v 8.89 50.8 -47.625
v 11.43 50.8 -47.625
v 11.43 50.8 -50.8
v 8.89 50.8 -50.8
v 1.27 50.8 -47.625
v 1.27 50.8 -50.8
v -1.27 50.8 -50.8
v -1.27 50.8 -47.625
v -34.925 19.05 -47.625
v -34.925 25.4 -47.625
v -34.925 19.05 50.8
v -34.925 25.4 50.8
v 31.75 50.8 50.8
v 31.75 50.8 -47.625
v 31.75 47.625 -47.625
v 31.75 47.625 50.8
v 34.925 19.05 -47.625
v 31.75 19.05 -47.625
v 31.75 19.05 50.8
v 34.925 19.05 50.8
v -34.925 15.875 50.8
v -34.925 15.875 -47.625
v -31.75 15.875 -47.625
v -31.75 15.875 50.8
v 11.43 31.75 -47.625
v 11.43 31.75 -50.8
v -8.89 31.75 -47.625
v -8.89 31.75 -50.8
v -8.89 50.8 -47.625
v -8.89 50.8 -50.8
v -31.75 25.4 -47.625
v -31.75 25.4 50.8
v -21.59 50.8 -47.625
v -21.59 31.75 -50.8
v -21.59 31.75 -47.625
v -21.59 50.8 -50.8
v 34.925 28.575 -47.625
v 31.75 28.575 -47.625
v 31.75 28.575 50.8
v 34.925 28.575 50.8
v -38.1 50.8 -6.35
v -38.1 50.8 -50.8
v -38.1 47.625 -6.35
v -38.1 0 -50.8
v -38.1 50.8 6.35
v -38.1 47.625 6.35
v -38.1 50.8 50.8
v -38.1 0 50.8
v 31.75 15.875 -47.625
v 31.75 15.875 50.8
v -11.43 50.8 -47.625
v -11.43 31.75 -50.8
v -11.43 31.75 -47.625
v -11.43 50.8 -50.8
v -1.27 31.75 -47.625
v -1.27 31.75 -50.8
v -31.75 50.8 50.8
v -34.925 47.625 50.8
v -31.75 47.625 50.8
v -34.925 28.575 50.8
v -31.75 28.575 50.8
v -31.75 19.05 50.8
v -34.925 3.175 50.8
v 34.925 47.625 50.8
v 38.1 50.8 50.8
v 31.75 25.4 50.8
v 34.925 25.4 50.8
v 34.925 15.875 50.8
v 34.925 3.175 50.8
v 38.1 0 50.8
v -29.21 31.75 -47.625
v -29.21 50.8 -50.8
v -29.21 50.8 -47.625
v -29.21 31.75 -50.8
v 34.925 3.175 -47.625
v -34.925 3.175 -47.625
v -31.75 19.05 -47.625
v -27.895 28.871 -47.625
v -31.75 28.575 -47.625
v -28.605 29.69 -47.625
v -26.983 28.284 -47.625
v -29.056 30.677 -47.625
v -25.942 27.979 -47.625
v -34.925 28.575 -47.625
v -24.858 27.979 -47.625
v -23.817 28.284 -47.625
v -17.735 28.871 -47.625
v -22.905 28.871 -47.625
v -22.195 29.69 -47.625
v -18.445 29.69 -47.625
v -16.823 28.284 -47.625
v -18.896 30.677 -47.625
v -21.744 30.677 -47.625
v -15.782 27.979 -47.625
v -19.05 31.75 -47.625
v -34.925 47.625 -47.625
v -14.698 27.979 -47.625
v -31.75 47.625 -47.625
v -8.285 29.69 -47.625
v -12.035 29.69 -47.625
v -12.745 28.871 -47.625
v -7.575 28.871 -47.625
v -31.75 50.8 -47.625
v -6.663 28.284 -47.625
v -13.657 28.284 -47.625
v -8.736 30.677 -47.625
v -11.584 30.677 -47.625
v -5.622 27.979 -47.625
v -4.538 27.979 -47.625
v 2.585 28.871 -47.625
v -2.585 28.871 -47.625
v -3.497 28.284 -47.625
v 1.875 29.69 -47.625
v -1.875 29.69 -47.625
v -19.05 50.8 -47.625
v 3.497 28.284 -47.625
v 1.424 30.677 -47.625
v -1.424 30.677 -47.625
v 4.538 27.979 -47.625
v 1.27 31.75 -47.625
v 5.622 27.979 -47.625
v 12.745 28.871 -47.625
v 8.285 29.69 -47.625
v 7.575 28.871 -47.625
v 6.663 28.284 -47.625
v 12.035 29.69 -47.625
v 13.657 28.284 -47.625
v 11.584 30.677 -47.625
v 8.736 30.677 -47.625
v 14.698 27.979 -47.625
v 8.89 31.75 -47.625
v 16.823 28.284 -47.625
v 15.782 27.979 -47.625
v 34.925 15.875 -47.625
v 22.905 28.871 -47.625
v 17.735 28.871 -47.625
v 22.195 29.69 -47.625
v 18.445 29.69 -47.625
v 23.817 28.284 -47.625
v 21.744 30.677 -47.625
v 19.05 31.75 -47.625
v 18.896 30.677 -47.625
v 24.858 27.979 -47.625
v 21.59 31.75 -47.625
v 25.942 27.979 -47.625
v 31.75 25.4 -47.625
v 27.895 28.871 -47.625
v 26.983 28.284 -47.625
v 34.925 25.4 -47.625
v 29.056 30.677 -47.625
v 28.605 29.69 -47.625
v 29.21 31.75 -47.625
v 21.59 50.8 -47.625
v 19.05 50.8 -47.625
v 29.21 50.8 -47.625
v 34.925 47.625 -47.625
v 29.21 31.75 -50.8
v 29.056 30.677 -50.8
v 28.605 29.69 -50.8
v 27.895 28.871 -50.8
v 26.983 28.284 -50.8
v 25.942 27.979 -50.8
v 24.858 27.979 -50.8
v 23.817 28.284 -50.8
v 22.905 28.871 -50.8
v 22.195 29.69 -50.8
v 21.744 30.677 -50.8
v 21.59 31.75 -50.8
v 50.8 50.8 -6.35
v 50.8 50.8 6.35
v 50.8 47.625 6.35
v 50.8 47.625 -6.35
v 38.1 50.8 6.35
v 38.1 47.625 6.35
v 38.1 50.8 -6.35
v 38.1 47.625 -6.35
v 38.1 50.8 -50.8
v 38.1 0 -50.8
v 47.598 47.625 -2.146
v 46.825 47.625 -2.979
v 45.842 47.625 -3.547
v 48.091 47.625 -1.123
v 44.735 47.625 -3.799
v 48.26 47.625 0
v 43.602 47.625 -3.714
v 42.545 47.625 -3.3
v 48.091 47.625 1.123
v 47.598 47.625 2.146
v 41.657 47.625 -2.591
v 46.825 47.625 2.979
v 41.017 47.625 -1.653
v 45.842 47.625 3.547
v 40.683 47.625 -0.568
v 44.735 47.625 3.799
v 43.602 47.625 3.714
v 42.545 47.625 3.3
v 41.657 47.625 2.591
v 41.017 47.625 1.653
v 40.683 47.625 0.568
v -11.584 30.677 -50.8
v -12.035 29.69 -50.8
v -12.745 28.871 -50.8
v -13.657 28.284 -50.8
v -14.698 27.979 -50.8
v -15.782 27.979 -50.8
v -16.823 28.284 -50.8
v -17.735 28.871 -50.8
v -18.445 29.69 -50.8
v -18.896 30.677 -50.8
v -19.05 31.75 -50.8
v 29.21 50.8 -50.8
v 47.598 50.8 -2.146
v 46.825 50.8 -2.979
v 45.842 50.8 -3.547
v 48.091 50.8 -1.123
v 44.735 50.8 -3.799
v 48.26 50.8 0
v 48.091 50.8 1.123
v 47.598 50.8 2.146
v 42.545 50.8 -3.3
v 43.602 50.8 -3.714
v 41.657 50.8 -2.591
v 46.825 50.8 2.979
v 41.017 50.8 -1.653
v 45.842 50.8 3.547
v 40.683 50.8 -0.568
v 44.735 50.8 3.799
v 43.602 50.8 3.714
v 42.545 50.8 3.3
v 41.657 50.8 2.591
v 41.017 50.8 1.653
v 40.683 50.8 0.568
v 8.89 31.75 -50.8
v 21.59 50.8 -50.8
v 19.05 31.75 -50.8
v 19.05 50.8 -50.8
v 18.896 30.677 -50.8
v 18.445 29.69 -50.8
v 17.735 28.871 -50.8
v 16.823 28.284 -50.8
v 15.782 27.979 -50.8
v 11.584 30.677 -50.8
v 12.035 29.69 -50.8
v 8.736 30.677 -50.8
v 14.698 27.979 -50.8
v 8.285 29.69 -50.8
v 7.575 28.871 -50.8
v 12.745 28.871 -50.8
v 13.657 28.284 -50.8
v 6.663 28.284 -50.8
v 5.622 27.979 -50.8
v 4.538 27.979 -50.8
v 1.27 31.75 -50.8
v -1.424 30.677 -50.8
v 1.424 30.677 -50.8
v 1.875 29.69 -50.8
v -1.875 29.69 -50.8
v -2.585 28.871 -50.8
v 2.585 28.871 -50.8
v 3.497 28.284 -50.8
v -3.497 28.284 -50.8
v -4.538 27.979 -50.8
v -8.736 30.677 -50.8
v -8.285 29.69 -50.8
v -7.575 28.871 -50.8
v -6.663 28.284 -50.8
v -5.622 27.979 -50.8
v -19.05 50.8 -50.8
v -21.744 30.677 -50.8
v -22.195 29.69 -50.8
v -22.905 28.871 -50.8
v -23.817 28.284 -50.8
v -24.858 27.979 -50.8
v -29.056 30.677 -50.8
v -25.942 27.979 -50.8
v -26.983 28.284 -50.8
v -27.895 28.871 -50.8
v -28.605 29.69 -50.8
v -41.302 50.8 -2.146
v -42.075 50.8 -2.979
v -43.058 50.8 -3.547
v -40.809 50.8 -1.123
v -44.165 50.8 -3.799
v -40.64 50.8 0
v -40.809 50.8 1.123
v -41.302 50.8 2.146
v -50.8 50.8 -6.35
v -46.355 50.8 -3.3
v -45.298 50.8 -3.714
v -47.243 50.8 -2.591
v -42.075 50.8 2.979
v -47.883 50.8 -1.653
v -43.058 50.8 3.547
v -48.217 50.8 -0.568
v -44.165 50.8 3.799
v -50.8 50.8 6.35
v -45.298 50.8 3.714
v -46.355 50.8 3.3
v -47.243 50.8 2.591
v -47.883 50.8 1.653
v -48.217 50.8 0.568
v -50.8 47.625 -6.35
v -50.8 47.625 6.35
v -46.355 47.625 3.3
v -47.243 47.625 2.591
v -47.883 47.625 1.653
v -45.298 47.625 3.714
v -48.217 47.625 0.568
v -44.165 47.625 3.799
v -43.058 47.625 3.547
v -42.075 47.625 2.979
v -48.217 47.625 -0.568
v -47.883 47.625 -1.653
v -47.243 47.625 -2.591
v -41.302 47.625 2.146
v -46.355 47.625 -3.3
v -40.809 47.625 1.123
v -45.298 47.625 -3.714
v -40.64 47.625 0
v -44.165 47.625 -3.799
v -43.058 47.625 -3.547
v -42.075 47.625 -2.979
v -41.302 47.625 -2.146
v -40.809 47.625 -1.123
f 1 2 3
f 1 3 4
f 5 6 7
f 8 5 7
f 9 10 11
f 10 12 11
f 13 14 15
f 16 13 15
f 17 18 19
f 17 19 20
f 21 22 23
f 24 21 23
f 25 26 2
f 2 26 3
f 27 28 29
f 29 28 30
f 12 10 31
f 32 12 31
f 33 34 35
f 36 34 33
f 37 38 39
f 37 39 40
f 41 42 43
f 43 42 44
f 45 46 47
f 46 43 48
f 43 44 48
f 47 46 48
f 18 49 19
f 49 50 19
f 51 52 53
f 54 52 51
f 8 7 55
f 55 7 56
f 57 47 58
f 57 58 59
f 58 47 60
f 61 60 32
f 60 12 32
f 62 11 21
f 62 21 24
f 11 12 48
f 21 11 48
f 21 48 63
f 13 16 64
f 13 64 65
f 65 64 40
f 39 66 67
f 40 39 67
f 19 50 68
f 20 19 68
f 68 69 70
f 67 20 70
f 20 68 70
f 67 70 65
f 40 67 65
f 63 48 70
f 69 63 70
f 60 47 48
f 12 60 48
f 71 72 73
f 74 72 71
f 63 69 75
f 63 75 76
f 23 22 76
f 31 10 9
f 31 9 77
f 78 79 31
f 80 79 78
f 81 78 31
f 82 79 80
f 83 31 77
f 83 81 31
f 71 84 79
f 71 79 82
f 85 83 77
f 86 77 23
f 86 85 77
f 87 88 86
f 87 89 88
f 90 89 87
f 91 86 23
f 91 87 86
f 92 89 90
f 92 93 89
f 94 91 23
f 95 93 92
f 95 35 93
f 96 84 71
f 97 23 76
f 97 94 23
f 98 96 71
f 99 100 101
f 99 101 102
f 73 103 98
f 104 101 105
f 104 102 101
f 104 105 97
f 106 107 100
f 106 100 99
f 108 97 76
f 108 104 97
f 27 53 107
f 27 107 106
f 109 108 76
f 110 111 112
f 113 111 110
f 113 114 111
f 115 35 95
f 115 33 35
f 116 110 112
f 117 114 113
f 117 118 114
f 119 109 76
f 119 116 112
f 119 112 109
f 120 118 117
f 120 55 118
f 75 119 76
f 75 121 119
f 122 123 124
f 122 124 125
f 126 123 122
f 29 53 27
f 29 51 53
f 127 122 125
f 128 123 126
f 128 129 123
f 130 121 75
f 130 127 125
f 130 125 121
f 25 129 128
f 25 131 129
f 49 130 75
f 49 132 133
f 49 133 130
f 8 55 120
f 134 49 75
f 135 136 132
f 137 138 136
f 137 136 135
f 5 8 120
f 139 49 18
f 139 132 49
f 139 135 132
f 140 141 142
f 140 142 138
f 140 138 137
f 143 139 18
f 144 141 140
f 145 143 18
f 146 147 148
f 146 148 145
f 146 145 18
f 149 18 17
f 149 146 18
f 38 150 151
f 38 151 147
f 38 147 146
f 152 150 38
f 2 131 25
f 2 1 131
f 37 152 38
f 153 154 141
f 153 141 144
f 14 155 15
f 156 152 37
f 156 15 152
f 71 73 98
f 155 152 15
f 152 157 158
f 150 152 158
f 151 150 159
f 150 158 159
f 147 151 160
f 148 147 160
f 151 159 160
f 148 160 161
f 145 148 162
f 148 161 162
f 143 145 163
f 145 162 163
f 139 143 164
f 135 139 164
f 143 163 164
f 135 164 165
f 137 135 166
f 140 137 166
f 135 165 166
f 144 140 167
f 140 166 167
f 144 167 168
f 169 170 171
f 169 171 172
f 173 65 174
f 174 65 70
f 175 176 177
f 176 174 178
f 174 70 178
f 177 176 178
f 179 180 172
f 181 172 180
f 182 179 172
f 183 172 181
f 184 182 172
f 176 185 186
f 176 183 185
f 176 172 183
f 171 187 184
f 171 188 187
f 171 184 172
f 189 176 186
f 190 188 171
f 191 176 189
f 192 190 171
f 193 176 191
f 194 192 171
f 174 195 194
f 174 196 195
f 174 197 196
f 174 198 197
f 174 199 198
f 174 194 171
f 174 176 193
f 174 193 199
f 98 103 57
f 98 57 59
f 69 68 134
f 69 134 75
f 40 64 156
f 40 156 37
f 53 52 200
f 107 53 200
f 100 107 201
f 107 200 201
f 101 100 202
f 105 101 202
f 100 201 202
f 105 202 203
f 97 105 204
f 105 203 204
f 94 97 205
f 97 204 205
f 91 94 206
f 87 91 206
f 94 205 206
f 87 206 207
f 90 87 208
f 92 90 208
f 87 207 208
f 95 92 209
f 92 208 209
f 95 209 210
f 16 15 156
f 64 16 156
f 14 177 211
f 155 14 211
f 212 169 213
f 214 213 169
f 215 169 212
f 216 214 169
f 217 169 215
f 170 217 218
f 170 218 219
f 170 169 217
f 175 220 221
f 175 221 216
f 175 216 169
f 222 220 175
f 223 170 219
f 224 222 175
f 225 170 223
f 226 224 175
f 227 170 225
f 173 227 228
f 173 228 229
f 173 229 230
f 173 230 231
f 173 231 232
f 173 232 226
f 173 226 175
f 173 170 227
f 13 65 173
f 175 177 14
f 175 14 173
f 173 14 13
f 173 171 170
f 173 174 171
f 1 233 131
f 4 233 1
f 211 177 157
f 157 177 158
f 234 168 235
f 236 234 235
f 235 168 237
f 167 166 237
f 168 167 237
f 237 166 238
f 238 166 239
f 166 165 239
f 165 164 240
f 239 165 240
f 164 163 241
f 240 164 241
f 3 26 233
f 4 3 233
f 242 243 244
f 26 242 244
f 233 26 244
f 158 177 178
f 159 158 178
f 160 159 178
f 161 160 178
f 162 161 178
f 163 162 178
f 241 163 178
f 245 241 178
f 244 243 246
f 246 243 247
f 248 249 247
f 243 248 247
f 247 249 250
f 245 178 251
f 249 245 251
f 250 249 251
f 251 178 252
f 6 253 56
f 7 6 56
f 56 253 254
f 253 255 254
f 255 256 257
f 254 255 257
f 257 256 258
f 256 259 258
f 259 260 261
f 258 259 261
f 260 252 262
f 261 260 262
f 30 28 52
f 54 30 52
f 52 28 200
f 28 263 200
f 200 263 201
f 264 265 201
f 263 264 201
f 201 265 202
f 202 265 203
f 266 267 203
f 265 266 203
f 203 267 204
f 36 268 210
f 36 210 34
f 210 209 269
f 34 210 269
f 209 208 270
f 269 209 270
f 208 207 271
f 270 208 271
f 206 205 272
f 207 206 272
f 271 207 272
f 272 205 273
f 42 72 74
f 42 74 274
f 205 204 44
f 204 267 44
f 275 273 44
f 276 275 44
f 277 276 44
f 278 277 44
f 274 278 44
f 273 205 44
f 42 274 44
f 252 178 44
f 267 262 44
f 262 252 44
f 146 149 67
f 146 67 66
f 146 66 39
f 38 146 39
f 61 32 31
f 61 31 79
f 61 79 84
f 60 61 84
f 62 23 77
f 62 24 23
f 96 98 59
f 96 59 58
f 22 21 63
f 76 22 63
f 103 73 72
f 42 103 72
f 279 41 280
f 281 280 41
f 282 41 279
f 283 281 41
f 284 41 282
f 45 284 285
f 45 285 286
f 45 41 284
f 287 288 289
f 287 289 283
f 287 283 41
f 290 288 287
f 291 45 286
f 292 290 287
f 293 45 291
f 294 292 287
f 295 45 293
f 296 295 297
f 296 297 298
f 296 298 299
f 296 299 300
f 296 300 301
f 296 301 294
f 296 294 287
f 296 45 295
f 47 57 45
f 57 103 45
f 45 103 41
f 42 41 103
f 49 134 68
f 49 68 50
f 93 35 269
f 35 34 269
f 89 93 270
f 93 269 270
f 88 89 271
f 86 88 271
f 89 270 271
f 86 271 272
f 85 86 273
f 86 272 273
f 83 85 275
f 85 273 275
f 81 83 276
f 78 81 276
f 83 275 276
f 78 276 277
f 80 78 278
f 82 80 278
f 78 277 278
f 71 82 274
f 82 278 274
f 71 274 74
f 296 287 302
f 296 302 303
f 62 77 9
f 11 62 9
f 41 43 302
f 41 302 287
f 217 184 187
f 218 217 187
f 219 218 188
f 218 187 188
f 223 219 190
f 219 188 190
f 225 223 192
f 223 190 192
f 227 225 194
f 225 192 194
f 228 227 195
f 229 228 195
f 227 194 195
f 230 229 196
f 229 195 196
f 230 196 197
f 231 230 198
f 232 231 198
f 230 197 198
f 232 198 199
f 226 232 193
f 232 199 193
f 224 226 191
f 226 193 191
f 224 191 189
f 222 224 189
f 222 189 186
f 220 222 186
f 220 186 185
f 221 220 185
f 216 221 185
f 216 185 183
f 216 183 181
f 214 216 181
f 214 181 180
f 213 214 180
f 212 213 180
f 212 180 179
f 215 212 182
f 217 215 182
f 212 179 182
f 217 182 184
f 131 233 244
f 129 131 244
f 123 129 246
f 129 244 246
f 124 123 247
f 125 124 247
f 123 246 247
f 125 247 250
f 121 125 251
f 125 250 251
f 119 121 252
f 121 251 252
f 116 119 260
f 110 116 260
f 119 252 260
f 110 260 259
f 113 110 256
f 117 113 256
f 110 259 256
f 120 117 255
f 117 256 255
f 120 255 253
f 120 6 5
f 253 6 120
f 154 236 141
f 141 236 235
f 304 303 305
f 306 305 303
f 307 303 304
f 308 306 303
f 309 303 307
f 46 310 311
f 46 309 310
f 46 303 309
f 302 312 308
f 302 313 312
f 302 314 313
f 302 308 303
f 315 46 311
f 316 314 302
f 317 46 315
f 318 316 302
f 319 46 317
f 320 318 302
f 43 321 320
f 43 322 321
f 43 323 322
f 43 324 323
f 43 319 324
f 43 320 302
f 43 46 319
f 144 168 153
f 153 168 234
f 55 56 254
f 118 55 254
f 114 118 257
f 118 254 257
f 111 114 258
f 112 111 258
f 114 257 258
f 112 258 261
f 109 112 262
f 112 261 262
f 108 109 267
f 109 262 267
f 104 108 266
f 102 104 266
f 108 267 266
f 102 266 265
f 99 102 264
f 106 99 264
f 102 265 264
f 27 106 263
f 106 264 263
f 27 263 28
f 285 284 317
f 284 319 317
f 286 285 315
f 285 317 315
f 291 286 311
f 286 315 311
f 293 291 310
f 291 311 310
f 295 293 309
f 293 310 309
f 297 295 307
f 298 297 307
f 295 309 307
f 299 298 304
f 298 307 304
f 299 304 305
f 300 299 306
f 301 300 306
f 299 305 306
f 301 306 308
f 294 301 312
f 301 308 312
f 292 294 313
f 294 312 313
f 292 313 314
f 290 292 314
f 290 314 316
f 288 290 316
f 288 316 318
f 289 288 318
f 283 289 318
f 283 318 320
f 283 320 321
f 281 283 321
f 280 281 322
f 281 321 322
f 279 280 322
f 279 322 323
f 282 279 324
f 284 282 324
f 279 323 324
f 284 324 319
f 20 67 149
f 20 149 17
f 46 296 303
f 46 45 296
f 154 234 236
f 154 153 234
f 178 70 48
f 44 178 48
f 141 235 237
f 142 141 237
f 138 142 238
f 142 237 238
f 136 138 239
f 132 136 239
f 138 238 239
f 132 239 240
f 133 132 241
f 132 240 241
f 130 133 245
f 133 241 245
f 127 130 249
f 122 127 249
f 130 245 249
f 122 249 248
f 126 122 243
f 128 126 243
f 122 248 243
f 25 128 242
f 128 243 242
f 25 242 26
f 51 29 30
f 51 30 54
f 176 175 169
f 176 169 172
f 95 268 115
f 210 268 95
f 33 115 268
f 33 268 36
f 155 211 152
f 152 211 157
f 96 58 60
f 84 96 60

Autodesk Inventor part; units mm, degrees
ref_plane "YZ Plane" through (0, 0, 0) normal (1, 0, 0) x (0, 1, 0)
ref_plane "XZ Plane" through (0, 0, 0) normal (0, 1, 0) x (-1, 0, 0)
ref_plane "XY Plane" through (0, 0, 0) normal (0, 0, 1) x (1, 0, 0)
sketch "Sketch1" plane through (0, 0, 0) normal (0, 1, 0) x (-1, 0, 0)
  line L0 (38.1, 50.8) -> (-38.1, 50.8)
  line L1 (-38.1, 50.8) -> (-38.1, -50.8)
  line L2 (-38.1, -50.8) -> (38.1, -50.8)
  line L3 (38.1, -50.8) -> (38.1, 50.8)
  point P0 (0, 0)
  dimension "d0" = 101.6
  dimension "d1" = 76.2
  dimension "d2" = 38.1
  dimension "d3" = 50.8
extrude "Extrusion1" add sketch "Sketch1" along normal blind 50.8
sketch "Sketch2" plane through (-38.1, 0, 50.8) normal (0, 0, 1) x (1, 0, 0)
  line L0 (76.2, 50.8) -> (0, 50.8) projected
  line L1 (76.2, 0) -> (0, 0) projected
  line L2 (0, 50.8) -> (3.175, 50.8)
  line L3 (3.175, 50.8) -> (3.175, 0)
  line L4 (0, 0) -> (0, 50.8)
  line L5 (76.2, 0) -> (76.2, 50.8) projected
  line L6 (0, 50.8) -> (76.2, 50.8)
  line L7 (76.2, 50.8) -> (76.2, 47.625)
  line L8 (0, 47.625) -> (0, 50.8)
  line L9 (76.2, 50.8) -> (73.025, 50.8)
  line L10 (73.025, 50.8) -> (73.025, 0)
  line L11 (76.2, 0) -> (76.2, 50.8)
  line L12 (3.175, 15.875) -> (6.35, 15.875)
  line L13 (6.35, 15.875) -> (6.35, 19.05)
  line L14 (6.35, 19.05) -> (3.175, 19.05)
  line L15 (3.175, 19.05) -> (3.175, 15.875)
  line L16 (3.175, 25.4) -> (6.35, 25.4)
  line L17 (6.35, 25.4) -> (6.35, 28.575)
  line L18 (6.35, 28.575) -> (3.175, 28.575)
  line L19 (3.175, 28.575) -> (3.175, 25.4)
  line L20 (38.1, 47.625) -> (38.1, 0)
  line L21 (73.025, 15.875) -> (69.85, 15.875)
  line L22 (69.85, 15.875) -> (69.85, 19.05)
  line L23 (69.85, 19.05) -> (73.025, 19.05)
  line L24 (73.025, 25.4) -> (69.85, 25.4)
  line L25 (69.85, 25.4) -> (69.85, 28.575)
  line L26 (69.85, 28.575) -> (73.025, 28.575)
  line L27 (3.175, 50.8) -> (6.35, 50.8)
  line L28 (6.35, 50.8) -> (6.35, 47.625)
  line L29 (6.35, 47.625) -> (3.175, 47.625)
  line L30 (3.175, 47.625) -> (3.175, 50.8)
  line L31 (73.025, 50.8) -> (69.85, 50.8)
  line L32 (69.85, 50.8) -> (69.85, 47.625)
  line L33 (69.85, 47.625) -> (73.025, 47.625)
  line L34 (73.025, 47.625) -> (73.025, 50.8)
  line L35 (0, 0) -> (76.2, 0)
  line L36 (76.2, 0) -> (76.2, 3.175)
  line L37 (76.2, 3.175) -> (0, 3.175)
  line L38 (0, 3.175) -> (0, 0)
  point P0 (3.175, 3.175)
  point P1 (73.025, 3.175)
  point P2 (6.35, 50.8)
  point P3 (3.175, 47.625)
  point P4 (3.175, 28.575)
  point P5 (3.175, 19.05)
  dimension "d6" = 3.175
  dimension "d8" = 3.175
  dimension "d11" = 3.175
  dimension "d12" = 3.175
  dimension "d13" = 3.175
  dimension "d15" = 6.35
  dimension "d16" = 3.175
  dimension "d17" = 12.7
  dimension "d18" = 0
extrude "Extrusion2" cut sketch "Sketch2" against normal blind 98.425 contours L32 L33 L10 L26 L25 L24 L23 L22 L21 L37 L3 L12 L13 L14 L16 L17 L18 L29 L28 L0
sketch "Sketch3" plane through (38.1, 0, -50.8) normal (0, 0, -1) x (-1, 0, 0)
  line L0 (0, 50.8) -> (76.2, 50.8) projected
  line L1 (38.1, 0) -> (38.1, 50.8) construction
  line L2 (29.21, 50.8) -> (36.83, 50.8)
  line L3 (36.83, 50.8) -> (36.83, 31.75)
  line L4 (29.21, 31.75) -> (29.21, 50.8)
  line L5 (26.67, 50.8) -> (19.05, 50.8)
  line L6 (19.05, 50.8) -> (19.05, 31.75)
  line L7 (26.67, 31.75) -> (26.67, 50.8)
  line L8 (33.02, 31.75) -> (33.02, 50.8) construction
  line L9 (22.86, 31.75) -> (22.86, 50.8) construction
  line L10 (16.51, 50.8) -> (8.89, 50.8)
  line L11 (8.89, 50.8) -> (8.89, 31.75)
  line L12 (16.51, 31.75) -> (16.51, 50.8)
  line L13 (12.7, 31.75) -> (12.7, 50.8) construction
  arc A0 (8.89, 31.75) -> (16.51, 31.75) centre (12.7, 31.75) ccw
  arc A1 (19.05, 31.75) -> (26.67, 31.75) centre (22.86, 31.75) ccw
  arc A2 (29.21, 31.75) -> (36.83, 31.75) centre (33.02, 31.75) ccw
  line L14 (8.89, 31.75) -> (36.83, 31.75) construction
  line L15 (46.99, 50.8) -> (39.37, 50.8)
  line L16 (39.37, 50.8) -> (39.37, 31.75)
  line L17 (46.99, 31.75) -> (46.99, 50.8)
  line L18 (49.53, 50.8) -> (57.15, 50.8)
  line L19 (57.15, 50.8) -> (57.15, 31.75)
  line L20 (49.53, 31.75) -> (49.53, 50.8)
  line L21 (43.18, 31.75) -> (43.18, 50.8) construction
  line L22 (53.34, 31.75) -> (53.34, 50.8) construction
  line L23 (59.69, 50.8) -> (67.31, 50.8)
  line L24 (67.31, 50.8) -> (67.31, 31.75)
  line L25 (59.69, 31.75) -> (59.69, 50.8)
  line L26 (63.5, 31.75) -> (63.5, 50.8) construction
  arc A3 (59.69, 31.75) -> (67.31, 31.75) centre (63.5, 31.75) ccw
  arc A4 (49.53, 31.75) -> (57.15, 31.75) centre (53.34, 31.75) ccw
  arc A5 (39.37, 31.75) -> (46.99, 31.75) centre (43.18, 31.75) ccw
  line L27 (67.31, 31.75) -> (39.37, 31.75) construction
  point P0 (19.05, 50.8)
  point P1 (8.89, 50.8)
  dimension "d21" = 10.16
  dimension "d22" = 5.08
  dimension "d24" = 7.62
  dimension "d25" = 7.62
  dimension "d26" = 10.16
  dimension "d27" = 7.62
  dimension "d28" = 19.05
extrude "Extrusion3" cut sketch "Sketch3" against normal blind 3.175
sketch "Sketch4" plane through (38.1, 0, 50.8) normal (1, 0, 0) x (0, 0, -1)
  line L0 (50.8, 0) -> (50.8, 50.8) construction
  line L1 (0, 50.8) -> (101.6, 50.8) projected
  line L2 (44.45, 50.8) -> (57.15, 50.8)
  line L3 (57.15, 50.8) -> (57.15, 47.625)
  line L4 (57.15, 47.625) -> (44.45, 47.625)
  line L5 (44.45, 47.625) -> (44.45, 50.8)
  point P0 (57.15, 50.8)
  dimension "d31" = 3.175
  dimension "d32" = 12.7
  dimension "d33" = 6.35
extrude "Extrusion4" add sketch "Sketch4" along normal blind 12.7
sketch "Sketch5" plane through (-38.1, 0, -50.8) normal (-1, 0, 0) x (0, 0, 1)
  line L0 (50.8, 0) -> (50.8, 50.8) construction
  line L1 (44.45, 50.8) -> (57.15, 50.8)
  line L2 (57.15, 50.8) -> (57.15, 47.625)
  line L3 (57.15, 47.625) -> (44.45, 47.625)
  line L4 (44.45, 47.625) -> (44.45, 50.8)
  dimension "d36" = 3.175
  dimension "d37" = 12.7
  dimension "d38" = 6.35
extrude "Extrusion5" add sketch "Sketch5" along normal blind 12.7
sketch "Sketch6" plane through (-38.1, 47.625, -6.35) normal (0, -1, 0) x (1, 0, 0)
  line L0 (0, 0) -> (-12.7, 0) projected
  line L1 (-6.35, 0) -> (-6.35, 12.7) construction
  line L2 (0, 12.7) -> (-12.7, 12.7) projected
  circle A0 centre (-6.35, 6.35) radius 3.81
  point P0 (38.1, 6.35)
  dimension "d41" = 7.62
extrude "Extrusion6" cut sketch "Sketch6" against normal blind 12.7
sketch "Sketch7" plane through (38.1, 47.625, -6.35) normal (0, -1, 0) x (1, 0, 0)
  line L0 (0, 12.7) -> (12.7, 12.7) projected
  line L1 (6.35, 12.7) -> (6.35, 0) construction
  line L2 (0, 0) -> (12.7, 0) projected
  circle A0 centre (6.35, 6.35) radius 3.81
  point P0 (-38.1, 6.35)
  dimension "d44" = 7.62
extrude "Extrusion7" cut sketch "Sketch7" against normal blind 12.7
equation "\"d2\" = 0.5 * d1"
equation "\"d3\" = 0.5 * d0"
equation "\"d8\" = d6"
equation "\"d11\" = d6"
equation "\"d12\" = d6"
equation "\"d13\" = d6"
equation "\"d33\" = 0.5 * d32"
equation "\"d38\" = 0.5 * d37"
properties part number "main"
